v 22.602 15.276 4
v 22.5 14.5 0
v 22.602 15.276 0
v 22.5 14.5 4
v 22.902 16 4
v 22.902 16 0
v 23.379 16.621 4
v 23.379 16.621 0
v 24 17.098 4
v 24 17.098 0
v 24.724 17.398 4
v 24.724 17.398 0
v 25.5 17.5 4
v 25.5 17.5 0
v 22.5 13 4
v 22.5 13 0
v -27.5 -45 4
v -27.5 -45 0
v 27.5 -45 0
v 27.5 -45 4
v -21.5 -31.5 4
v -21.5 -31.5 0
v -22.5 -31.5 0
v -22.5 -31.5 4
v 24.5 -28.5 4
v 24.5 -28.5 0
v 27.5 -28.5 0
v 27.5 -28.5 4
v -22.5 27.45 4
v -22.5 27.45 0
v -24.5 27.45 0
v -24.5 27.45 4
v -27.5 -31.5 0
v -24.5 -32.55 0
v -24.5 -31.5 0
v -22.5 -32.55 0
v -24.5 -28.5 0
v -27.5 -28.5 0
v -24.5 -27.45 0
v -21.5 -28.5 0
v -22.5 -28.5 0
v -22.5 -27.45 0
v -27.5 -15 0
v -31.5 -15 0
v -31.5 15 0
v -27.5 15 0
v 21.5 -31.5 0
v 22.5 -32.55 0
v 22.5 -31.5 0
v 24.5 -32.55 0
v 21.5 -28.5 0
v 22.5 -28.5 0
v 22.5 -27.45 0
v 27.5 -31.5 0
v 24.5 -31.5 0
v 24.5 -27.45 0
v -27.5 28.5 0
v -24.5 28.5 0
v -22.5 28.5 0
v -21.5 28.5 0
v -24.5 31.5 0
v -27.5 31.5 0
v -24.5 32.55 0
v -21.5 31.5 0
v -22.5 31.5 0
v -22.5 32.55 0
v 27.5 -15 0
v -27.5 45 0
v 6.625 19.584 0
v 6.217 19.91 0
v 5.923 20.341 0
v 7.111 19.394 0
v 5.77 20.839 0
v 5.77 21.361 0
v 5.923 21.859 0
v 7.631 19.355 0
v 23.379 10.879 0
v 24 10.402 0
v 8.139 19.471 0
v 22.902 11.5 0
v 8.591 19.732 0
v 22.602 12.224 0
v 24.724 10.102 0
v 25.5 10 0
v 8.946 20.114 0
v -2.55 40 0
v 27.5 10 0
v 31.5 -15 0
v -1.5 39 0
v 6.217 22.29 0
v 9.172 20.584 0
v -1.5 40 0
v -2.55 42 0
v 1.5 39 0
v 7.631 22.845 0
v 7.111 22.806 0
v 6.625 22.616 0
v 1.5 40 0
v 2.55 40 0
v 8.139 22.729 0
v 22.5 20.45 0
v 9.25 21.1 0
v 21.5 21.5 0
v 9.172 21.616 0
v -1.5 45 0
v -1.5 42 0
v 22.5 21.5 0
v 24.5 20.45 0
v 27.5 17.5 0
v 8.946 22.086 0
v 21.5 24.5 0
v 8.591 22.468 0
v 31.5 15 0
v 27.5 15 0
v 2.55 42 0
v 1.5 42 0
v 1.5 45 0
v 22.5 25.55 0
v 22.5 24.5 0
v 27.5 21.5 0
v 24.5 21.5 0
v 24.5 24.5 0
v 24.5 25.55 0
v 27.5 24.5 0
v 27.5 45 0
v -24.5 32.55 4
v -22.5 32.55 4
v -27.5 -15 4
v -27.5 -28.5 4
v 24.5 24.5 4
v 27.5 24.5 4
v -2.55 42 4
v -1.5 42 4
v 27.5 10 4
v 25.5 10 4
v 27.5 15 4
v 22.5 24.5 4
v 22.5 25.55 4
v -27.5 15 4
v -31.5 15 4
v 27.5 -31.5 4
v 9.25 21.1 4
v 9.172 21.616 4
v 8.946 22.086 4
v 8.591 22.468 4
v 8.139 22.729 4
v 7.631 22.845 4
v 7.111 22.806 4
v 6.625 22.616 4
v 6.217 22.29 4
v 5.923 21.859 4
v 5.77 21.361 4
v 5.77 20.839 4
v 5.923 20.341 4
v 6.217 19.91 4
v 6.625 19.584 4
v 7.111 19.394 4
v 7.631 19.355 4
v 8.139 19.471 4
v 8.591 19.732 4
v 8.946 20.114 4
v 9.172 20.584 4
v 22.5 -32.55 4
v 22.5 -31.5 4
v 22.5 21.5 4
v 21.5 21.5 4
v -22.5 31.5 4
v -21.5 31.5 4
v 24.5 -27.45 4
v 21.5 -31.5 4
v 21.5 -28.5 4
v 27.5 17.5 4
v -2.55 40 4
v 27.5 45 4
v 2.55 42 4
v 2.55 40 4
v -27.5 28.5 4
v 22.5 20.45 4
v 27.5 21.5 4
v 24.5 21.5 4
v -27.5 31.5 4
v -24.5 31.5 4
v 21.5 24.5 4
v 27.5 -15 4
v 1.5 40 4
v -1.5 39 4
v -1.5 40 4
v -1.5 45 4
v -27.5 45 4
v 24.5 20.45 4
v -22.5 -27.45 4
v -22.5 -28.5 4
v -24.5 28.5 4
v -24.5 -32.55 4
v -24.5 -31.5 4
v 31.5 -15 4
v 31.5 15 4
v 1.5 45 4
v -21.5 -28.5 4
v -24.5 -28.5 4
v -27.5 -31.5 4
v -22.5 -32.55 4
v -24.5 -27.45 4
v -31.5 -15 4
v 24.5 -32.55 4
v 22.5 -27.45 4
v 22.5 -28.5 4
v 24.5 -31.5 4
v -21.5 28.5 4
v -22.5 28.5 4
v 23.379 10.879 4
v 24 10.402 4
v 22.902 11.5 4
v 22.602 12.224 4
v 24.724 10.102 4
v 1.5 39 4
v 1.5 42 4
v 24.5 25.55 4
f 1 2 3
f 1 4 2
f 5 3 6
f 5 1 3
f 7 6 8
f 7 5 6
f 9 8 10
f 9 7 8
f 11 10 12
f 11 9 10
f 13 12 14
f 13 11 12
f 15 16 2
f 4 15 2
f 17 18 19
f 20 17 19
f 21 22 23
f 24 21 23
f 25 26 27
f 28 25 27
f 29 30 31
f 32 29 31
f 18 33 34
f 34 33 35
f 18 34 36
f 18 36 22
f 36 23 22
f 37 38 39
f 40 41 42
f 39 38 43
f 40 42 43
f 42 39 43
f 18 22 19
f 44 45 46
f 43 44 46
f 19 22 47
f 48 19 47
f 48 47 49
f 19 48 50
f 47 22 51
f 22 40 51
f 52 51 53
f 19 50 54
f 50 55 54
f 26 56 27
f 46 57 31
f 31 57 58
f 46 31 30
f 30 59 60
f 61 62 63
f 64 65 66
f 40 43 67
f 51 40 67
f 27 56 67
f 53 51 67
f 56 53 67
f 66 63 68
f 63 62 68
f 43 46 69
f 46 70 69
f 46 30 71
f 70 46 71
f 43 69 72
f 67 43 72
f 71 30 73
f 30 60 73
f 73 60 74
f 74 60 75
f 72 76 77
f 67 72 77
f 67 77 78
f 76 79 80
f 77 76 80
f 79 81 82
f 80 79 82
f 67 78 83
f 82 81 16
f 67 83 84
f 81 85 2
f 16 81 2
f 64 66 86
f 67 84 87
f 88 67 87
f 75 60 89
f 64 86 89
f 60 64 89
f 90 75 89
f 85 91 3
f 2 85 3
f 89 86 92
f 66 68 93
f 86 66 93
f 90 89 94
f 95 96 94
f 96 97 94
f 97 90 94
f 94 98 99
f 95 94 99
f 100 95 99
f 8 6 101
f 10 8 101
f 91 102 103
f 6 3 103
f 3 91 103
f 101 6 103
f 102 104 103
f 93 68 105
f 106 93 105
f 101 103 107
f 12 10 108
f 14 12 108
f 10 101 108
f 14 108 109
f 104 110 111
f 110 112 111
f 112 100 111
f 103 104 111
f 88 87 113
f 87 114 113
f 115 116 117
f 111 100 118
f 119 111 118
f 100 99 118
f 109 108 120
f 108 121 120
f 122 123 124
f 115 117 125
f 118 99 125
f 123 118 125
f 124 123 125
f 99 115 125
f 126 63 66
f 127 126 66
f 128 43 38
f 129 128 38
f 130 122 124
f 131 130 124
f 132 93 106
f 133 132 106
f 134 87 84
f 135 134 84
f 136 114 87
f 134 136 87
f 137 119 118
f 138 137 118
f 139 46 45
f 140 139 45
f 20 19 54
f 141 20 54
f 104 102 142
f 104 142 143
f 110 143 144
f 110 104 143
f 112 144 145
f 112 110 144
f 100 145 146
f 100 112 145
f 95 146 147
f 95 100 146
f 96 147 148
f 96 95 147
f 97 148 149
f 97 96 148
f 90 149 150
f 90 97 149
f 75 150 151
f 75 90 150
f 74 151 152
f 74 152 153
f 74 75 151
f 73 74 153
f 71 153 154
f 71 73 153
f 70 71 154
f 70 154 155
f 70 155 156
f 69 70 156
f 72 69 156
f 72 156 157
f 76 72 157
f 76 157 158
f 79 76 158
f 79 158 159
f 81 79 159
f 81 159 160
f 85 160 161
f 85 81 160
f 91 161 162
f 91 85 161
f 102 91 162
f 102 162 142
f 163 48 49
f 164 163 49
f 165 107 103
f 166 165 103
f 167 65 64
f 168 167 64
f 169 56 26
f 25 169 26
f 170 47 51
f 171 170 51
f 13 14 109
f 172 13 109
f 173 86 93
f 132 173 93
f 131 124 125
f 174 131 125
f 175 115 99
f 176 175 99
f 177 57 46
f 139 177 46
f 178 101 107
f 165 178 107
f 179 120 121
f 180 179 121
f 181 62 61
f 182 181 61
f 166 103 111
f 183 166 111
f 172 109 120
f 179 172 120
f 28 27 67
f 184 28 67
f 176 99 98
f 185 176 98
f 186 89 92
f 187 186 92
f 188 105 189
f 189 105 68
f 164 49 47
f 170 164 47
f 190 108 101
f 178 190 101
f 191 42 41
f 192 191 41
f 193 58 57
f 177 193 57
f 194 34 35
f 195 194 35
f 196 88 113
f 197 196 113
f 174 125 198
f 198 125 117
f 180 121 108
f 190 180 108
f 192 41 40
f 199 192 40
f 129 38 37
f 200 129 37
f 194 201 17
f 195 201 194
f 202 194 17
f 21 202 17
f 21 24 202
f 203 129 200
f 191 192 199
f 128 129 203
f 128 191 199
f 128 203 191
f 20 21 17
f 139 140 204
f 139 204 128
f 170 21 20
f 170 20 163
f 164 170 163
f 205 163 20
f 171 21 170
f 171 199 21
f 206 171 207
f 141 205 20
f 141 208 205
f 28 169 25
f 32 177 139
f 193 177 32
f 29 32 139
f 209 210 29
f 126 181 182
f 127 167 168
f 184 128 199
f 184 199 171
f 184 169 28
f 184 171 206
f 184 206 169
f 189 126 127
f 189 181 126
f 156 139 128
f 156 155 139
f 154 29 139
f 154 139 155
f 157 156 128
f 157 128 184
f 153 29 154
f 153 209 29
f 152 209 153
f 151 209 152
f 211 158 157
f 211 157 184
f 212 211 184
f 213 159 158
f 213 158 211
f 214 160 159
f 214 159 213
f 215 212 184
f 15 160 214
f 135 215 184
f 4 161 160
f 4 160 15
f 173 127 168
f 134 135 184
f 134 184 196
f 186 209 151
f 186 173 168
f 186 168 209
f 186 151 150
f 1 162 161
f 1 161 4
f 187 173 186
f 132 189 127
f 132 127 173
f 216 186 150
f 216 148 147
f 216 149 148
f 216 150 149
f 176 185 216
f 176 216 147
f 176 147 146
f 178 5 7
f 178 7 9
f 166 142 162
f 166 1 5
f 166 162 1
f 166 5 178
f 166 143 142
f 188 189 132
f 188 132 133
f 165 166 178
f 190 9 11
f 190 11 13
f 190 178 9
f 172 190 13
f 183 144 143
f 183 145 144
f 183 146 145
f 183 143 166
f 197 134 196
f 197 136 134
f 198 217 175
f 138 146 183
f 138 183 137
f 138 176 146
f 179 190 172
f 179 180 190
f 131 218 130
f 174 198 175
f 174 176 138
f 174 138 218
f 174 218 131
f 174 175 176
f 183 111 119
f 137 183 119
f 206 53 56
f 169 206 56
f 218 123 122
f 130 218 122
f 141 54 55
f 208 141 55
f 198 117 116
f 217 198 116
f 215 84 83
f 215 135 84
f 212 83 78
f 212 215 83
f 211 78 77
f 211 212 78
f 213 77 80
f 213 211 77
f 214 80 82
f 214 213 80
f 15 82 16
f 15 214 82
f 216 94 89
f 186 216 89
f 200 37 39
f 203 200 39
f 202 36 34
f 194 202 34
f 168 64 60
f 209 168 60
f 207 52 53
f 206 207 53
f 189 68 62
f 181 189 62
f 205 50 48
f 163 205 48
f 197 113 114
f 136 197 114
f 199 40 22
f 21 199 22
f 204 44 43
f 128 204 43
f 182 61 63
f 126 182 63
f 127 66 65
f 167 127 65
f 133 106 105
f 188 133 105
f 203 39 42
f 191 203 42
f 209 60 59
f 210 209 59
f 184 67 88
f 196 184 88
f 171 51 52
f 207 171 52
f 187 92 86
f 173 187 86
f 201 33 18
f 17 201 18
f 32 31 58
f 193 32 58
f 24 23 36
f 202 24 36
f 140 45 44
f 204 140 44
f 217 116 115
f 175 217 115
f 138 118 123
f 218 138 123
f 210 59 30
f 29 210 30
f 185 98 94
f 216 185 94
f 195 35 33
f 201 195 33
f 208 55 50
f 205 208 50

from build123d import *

# Parameters (mm, degrees)
SKETCH_1_R      = 1.75
EXTRUDE_1_DEPTH = 4
FILLET_1_R      = 3


with BuildPart() as part:
    # Эскиз1 → Бобышка-Вытянуть1 (new body)
    with BuildSketch(Plane.XY):
        Polygon((-27.5, -31.5), (-27.5, -45), (27.5, -45), (27.5, -31.5), (24.5, -31.5), (24.5, -32.55), (22.5, -32.55), (22.5, -31.5), (21.5, -31.5), (21.5, -28.5), (22.5, -28.5), (22.5, -27.45), (24.5, -27.45), (24.5, -28.5), (27.5, -28.5), (27.5, -15), (31.5, -15), (31.5, 15), (27.5, 15), (27.5, 10), (22.5, 10), (22.5, 17.5), (27.5, 17.5), (27.5, 21.5), (24.5, 21.5), (24.5, 20.45), (22.5, 20.45), (22.5, 21.5), (21.5, 21.5), (21.5, 24.5), (22.5, 24.5), (22.5, 25.55), (24.5, 25.55), (24.5, 24.5), (27.5, 24.5), (27.5, 45), (1.5, 45), (1.5, 42), (2.55, 42), (2.55, 40), (1.5, 40), (1.5, 39), (-1.5, 39), (-1.5, 40), (-2.55, 40), (-2.55, 42), (-1.5, 42), (-1.5, 45), (-27.5, 45), (-27.5, 31.5), (-24.5, 31.5), (-24.5, 32.55), (-22.5, 32.55), (-22.5, 31.5), (-21.5, 31.5), (-21.5, 28.5), (-22.5, 28.5), (-22.5, 27.45), (-24.5, 27.45), (-24.5, 28.5), (-27.5, 28.5), (-27.5, 15), (-31.5, 15), (-31.5, -15), (-27.5, -15), (-27.5, -28.5), (-24.5, -28.5), (-24.5, -27.45), (-22.5, -27.45), (-22.5, -28.5), (-21.5, -28.5), (-21.5, -31.5), (-22.5, -31.5), (-22.5, -32.55), (-24.5, -32.55), (-24.5, -31.5), align=None)
        with Locations((7.5, 21.1)):
            Circle(SKETCH_1_R, mode=Mode.SUBTRACT)
    extrude(amount=EXTRUDE_1_DEPTH)

    # Скругление1
    fillet_1_edges = [part.edges().sort_by_distance(p)[0] for p in [
        (22.5, 17.5, 2),
        (22.5, 10, 2),
    ]]
    fillet(fillet_1_edges, radius=FILLET_1_R)


solid = part.part
